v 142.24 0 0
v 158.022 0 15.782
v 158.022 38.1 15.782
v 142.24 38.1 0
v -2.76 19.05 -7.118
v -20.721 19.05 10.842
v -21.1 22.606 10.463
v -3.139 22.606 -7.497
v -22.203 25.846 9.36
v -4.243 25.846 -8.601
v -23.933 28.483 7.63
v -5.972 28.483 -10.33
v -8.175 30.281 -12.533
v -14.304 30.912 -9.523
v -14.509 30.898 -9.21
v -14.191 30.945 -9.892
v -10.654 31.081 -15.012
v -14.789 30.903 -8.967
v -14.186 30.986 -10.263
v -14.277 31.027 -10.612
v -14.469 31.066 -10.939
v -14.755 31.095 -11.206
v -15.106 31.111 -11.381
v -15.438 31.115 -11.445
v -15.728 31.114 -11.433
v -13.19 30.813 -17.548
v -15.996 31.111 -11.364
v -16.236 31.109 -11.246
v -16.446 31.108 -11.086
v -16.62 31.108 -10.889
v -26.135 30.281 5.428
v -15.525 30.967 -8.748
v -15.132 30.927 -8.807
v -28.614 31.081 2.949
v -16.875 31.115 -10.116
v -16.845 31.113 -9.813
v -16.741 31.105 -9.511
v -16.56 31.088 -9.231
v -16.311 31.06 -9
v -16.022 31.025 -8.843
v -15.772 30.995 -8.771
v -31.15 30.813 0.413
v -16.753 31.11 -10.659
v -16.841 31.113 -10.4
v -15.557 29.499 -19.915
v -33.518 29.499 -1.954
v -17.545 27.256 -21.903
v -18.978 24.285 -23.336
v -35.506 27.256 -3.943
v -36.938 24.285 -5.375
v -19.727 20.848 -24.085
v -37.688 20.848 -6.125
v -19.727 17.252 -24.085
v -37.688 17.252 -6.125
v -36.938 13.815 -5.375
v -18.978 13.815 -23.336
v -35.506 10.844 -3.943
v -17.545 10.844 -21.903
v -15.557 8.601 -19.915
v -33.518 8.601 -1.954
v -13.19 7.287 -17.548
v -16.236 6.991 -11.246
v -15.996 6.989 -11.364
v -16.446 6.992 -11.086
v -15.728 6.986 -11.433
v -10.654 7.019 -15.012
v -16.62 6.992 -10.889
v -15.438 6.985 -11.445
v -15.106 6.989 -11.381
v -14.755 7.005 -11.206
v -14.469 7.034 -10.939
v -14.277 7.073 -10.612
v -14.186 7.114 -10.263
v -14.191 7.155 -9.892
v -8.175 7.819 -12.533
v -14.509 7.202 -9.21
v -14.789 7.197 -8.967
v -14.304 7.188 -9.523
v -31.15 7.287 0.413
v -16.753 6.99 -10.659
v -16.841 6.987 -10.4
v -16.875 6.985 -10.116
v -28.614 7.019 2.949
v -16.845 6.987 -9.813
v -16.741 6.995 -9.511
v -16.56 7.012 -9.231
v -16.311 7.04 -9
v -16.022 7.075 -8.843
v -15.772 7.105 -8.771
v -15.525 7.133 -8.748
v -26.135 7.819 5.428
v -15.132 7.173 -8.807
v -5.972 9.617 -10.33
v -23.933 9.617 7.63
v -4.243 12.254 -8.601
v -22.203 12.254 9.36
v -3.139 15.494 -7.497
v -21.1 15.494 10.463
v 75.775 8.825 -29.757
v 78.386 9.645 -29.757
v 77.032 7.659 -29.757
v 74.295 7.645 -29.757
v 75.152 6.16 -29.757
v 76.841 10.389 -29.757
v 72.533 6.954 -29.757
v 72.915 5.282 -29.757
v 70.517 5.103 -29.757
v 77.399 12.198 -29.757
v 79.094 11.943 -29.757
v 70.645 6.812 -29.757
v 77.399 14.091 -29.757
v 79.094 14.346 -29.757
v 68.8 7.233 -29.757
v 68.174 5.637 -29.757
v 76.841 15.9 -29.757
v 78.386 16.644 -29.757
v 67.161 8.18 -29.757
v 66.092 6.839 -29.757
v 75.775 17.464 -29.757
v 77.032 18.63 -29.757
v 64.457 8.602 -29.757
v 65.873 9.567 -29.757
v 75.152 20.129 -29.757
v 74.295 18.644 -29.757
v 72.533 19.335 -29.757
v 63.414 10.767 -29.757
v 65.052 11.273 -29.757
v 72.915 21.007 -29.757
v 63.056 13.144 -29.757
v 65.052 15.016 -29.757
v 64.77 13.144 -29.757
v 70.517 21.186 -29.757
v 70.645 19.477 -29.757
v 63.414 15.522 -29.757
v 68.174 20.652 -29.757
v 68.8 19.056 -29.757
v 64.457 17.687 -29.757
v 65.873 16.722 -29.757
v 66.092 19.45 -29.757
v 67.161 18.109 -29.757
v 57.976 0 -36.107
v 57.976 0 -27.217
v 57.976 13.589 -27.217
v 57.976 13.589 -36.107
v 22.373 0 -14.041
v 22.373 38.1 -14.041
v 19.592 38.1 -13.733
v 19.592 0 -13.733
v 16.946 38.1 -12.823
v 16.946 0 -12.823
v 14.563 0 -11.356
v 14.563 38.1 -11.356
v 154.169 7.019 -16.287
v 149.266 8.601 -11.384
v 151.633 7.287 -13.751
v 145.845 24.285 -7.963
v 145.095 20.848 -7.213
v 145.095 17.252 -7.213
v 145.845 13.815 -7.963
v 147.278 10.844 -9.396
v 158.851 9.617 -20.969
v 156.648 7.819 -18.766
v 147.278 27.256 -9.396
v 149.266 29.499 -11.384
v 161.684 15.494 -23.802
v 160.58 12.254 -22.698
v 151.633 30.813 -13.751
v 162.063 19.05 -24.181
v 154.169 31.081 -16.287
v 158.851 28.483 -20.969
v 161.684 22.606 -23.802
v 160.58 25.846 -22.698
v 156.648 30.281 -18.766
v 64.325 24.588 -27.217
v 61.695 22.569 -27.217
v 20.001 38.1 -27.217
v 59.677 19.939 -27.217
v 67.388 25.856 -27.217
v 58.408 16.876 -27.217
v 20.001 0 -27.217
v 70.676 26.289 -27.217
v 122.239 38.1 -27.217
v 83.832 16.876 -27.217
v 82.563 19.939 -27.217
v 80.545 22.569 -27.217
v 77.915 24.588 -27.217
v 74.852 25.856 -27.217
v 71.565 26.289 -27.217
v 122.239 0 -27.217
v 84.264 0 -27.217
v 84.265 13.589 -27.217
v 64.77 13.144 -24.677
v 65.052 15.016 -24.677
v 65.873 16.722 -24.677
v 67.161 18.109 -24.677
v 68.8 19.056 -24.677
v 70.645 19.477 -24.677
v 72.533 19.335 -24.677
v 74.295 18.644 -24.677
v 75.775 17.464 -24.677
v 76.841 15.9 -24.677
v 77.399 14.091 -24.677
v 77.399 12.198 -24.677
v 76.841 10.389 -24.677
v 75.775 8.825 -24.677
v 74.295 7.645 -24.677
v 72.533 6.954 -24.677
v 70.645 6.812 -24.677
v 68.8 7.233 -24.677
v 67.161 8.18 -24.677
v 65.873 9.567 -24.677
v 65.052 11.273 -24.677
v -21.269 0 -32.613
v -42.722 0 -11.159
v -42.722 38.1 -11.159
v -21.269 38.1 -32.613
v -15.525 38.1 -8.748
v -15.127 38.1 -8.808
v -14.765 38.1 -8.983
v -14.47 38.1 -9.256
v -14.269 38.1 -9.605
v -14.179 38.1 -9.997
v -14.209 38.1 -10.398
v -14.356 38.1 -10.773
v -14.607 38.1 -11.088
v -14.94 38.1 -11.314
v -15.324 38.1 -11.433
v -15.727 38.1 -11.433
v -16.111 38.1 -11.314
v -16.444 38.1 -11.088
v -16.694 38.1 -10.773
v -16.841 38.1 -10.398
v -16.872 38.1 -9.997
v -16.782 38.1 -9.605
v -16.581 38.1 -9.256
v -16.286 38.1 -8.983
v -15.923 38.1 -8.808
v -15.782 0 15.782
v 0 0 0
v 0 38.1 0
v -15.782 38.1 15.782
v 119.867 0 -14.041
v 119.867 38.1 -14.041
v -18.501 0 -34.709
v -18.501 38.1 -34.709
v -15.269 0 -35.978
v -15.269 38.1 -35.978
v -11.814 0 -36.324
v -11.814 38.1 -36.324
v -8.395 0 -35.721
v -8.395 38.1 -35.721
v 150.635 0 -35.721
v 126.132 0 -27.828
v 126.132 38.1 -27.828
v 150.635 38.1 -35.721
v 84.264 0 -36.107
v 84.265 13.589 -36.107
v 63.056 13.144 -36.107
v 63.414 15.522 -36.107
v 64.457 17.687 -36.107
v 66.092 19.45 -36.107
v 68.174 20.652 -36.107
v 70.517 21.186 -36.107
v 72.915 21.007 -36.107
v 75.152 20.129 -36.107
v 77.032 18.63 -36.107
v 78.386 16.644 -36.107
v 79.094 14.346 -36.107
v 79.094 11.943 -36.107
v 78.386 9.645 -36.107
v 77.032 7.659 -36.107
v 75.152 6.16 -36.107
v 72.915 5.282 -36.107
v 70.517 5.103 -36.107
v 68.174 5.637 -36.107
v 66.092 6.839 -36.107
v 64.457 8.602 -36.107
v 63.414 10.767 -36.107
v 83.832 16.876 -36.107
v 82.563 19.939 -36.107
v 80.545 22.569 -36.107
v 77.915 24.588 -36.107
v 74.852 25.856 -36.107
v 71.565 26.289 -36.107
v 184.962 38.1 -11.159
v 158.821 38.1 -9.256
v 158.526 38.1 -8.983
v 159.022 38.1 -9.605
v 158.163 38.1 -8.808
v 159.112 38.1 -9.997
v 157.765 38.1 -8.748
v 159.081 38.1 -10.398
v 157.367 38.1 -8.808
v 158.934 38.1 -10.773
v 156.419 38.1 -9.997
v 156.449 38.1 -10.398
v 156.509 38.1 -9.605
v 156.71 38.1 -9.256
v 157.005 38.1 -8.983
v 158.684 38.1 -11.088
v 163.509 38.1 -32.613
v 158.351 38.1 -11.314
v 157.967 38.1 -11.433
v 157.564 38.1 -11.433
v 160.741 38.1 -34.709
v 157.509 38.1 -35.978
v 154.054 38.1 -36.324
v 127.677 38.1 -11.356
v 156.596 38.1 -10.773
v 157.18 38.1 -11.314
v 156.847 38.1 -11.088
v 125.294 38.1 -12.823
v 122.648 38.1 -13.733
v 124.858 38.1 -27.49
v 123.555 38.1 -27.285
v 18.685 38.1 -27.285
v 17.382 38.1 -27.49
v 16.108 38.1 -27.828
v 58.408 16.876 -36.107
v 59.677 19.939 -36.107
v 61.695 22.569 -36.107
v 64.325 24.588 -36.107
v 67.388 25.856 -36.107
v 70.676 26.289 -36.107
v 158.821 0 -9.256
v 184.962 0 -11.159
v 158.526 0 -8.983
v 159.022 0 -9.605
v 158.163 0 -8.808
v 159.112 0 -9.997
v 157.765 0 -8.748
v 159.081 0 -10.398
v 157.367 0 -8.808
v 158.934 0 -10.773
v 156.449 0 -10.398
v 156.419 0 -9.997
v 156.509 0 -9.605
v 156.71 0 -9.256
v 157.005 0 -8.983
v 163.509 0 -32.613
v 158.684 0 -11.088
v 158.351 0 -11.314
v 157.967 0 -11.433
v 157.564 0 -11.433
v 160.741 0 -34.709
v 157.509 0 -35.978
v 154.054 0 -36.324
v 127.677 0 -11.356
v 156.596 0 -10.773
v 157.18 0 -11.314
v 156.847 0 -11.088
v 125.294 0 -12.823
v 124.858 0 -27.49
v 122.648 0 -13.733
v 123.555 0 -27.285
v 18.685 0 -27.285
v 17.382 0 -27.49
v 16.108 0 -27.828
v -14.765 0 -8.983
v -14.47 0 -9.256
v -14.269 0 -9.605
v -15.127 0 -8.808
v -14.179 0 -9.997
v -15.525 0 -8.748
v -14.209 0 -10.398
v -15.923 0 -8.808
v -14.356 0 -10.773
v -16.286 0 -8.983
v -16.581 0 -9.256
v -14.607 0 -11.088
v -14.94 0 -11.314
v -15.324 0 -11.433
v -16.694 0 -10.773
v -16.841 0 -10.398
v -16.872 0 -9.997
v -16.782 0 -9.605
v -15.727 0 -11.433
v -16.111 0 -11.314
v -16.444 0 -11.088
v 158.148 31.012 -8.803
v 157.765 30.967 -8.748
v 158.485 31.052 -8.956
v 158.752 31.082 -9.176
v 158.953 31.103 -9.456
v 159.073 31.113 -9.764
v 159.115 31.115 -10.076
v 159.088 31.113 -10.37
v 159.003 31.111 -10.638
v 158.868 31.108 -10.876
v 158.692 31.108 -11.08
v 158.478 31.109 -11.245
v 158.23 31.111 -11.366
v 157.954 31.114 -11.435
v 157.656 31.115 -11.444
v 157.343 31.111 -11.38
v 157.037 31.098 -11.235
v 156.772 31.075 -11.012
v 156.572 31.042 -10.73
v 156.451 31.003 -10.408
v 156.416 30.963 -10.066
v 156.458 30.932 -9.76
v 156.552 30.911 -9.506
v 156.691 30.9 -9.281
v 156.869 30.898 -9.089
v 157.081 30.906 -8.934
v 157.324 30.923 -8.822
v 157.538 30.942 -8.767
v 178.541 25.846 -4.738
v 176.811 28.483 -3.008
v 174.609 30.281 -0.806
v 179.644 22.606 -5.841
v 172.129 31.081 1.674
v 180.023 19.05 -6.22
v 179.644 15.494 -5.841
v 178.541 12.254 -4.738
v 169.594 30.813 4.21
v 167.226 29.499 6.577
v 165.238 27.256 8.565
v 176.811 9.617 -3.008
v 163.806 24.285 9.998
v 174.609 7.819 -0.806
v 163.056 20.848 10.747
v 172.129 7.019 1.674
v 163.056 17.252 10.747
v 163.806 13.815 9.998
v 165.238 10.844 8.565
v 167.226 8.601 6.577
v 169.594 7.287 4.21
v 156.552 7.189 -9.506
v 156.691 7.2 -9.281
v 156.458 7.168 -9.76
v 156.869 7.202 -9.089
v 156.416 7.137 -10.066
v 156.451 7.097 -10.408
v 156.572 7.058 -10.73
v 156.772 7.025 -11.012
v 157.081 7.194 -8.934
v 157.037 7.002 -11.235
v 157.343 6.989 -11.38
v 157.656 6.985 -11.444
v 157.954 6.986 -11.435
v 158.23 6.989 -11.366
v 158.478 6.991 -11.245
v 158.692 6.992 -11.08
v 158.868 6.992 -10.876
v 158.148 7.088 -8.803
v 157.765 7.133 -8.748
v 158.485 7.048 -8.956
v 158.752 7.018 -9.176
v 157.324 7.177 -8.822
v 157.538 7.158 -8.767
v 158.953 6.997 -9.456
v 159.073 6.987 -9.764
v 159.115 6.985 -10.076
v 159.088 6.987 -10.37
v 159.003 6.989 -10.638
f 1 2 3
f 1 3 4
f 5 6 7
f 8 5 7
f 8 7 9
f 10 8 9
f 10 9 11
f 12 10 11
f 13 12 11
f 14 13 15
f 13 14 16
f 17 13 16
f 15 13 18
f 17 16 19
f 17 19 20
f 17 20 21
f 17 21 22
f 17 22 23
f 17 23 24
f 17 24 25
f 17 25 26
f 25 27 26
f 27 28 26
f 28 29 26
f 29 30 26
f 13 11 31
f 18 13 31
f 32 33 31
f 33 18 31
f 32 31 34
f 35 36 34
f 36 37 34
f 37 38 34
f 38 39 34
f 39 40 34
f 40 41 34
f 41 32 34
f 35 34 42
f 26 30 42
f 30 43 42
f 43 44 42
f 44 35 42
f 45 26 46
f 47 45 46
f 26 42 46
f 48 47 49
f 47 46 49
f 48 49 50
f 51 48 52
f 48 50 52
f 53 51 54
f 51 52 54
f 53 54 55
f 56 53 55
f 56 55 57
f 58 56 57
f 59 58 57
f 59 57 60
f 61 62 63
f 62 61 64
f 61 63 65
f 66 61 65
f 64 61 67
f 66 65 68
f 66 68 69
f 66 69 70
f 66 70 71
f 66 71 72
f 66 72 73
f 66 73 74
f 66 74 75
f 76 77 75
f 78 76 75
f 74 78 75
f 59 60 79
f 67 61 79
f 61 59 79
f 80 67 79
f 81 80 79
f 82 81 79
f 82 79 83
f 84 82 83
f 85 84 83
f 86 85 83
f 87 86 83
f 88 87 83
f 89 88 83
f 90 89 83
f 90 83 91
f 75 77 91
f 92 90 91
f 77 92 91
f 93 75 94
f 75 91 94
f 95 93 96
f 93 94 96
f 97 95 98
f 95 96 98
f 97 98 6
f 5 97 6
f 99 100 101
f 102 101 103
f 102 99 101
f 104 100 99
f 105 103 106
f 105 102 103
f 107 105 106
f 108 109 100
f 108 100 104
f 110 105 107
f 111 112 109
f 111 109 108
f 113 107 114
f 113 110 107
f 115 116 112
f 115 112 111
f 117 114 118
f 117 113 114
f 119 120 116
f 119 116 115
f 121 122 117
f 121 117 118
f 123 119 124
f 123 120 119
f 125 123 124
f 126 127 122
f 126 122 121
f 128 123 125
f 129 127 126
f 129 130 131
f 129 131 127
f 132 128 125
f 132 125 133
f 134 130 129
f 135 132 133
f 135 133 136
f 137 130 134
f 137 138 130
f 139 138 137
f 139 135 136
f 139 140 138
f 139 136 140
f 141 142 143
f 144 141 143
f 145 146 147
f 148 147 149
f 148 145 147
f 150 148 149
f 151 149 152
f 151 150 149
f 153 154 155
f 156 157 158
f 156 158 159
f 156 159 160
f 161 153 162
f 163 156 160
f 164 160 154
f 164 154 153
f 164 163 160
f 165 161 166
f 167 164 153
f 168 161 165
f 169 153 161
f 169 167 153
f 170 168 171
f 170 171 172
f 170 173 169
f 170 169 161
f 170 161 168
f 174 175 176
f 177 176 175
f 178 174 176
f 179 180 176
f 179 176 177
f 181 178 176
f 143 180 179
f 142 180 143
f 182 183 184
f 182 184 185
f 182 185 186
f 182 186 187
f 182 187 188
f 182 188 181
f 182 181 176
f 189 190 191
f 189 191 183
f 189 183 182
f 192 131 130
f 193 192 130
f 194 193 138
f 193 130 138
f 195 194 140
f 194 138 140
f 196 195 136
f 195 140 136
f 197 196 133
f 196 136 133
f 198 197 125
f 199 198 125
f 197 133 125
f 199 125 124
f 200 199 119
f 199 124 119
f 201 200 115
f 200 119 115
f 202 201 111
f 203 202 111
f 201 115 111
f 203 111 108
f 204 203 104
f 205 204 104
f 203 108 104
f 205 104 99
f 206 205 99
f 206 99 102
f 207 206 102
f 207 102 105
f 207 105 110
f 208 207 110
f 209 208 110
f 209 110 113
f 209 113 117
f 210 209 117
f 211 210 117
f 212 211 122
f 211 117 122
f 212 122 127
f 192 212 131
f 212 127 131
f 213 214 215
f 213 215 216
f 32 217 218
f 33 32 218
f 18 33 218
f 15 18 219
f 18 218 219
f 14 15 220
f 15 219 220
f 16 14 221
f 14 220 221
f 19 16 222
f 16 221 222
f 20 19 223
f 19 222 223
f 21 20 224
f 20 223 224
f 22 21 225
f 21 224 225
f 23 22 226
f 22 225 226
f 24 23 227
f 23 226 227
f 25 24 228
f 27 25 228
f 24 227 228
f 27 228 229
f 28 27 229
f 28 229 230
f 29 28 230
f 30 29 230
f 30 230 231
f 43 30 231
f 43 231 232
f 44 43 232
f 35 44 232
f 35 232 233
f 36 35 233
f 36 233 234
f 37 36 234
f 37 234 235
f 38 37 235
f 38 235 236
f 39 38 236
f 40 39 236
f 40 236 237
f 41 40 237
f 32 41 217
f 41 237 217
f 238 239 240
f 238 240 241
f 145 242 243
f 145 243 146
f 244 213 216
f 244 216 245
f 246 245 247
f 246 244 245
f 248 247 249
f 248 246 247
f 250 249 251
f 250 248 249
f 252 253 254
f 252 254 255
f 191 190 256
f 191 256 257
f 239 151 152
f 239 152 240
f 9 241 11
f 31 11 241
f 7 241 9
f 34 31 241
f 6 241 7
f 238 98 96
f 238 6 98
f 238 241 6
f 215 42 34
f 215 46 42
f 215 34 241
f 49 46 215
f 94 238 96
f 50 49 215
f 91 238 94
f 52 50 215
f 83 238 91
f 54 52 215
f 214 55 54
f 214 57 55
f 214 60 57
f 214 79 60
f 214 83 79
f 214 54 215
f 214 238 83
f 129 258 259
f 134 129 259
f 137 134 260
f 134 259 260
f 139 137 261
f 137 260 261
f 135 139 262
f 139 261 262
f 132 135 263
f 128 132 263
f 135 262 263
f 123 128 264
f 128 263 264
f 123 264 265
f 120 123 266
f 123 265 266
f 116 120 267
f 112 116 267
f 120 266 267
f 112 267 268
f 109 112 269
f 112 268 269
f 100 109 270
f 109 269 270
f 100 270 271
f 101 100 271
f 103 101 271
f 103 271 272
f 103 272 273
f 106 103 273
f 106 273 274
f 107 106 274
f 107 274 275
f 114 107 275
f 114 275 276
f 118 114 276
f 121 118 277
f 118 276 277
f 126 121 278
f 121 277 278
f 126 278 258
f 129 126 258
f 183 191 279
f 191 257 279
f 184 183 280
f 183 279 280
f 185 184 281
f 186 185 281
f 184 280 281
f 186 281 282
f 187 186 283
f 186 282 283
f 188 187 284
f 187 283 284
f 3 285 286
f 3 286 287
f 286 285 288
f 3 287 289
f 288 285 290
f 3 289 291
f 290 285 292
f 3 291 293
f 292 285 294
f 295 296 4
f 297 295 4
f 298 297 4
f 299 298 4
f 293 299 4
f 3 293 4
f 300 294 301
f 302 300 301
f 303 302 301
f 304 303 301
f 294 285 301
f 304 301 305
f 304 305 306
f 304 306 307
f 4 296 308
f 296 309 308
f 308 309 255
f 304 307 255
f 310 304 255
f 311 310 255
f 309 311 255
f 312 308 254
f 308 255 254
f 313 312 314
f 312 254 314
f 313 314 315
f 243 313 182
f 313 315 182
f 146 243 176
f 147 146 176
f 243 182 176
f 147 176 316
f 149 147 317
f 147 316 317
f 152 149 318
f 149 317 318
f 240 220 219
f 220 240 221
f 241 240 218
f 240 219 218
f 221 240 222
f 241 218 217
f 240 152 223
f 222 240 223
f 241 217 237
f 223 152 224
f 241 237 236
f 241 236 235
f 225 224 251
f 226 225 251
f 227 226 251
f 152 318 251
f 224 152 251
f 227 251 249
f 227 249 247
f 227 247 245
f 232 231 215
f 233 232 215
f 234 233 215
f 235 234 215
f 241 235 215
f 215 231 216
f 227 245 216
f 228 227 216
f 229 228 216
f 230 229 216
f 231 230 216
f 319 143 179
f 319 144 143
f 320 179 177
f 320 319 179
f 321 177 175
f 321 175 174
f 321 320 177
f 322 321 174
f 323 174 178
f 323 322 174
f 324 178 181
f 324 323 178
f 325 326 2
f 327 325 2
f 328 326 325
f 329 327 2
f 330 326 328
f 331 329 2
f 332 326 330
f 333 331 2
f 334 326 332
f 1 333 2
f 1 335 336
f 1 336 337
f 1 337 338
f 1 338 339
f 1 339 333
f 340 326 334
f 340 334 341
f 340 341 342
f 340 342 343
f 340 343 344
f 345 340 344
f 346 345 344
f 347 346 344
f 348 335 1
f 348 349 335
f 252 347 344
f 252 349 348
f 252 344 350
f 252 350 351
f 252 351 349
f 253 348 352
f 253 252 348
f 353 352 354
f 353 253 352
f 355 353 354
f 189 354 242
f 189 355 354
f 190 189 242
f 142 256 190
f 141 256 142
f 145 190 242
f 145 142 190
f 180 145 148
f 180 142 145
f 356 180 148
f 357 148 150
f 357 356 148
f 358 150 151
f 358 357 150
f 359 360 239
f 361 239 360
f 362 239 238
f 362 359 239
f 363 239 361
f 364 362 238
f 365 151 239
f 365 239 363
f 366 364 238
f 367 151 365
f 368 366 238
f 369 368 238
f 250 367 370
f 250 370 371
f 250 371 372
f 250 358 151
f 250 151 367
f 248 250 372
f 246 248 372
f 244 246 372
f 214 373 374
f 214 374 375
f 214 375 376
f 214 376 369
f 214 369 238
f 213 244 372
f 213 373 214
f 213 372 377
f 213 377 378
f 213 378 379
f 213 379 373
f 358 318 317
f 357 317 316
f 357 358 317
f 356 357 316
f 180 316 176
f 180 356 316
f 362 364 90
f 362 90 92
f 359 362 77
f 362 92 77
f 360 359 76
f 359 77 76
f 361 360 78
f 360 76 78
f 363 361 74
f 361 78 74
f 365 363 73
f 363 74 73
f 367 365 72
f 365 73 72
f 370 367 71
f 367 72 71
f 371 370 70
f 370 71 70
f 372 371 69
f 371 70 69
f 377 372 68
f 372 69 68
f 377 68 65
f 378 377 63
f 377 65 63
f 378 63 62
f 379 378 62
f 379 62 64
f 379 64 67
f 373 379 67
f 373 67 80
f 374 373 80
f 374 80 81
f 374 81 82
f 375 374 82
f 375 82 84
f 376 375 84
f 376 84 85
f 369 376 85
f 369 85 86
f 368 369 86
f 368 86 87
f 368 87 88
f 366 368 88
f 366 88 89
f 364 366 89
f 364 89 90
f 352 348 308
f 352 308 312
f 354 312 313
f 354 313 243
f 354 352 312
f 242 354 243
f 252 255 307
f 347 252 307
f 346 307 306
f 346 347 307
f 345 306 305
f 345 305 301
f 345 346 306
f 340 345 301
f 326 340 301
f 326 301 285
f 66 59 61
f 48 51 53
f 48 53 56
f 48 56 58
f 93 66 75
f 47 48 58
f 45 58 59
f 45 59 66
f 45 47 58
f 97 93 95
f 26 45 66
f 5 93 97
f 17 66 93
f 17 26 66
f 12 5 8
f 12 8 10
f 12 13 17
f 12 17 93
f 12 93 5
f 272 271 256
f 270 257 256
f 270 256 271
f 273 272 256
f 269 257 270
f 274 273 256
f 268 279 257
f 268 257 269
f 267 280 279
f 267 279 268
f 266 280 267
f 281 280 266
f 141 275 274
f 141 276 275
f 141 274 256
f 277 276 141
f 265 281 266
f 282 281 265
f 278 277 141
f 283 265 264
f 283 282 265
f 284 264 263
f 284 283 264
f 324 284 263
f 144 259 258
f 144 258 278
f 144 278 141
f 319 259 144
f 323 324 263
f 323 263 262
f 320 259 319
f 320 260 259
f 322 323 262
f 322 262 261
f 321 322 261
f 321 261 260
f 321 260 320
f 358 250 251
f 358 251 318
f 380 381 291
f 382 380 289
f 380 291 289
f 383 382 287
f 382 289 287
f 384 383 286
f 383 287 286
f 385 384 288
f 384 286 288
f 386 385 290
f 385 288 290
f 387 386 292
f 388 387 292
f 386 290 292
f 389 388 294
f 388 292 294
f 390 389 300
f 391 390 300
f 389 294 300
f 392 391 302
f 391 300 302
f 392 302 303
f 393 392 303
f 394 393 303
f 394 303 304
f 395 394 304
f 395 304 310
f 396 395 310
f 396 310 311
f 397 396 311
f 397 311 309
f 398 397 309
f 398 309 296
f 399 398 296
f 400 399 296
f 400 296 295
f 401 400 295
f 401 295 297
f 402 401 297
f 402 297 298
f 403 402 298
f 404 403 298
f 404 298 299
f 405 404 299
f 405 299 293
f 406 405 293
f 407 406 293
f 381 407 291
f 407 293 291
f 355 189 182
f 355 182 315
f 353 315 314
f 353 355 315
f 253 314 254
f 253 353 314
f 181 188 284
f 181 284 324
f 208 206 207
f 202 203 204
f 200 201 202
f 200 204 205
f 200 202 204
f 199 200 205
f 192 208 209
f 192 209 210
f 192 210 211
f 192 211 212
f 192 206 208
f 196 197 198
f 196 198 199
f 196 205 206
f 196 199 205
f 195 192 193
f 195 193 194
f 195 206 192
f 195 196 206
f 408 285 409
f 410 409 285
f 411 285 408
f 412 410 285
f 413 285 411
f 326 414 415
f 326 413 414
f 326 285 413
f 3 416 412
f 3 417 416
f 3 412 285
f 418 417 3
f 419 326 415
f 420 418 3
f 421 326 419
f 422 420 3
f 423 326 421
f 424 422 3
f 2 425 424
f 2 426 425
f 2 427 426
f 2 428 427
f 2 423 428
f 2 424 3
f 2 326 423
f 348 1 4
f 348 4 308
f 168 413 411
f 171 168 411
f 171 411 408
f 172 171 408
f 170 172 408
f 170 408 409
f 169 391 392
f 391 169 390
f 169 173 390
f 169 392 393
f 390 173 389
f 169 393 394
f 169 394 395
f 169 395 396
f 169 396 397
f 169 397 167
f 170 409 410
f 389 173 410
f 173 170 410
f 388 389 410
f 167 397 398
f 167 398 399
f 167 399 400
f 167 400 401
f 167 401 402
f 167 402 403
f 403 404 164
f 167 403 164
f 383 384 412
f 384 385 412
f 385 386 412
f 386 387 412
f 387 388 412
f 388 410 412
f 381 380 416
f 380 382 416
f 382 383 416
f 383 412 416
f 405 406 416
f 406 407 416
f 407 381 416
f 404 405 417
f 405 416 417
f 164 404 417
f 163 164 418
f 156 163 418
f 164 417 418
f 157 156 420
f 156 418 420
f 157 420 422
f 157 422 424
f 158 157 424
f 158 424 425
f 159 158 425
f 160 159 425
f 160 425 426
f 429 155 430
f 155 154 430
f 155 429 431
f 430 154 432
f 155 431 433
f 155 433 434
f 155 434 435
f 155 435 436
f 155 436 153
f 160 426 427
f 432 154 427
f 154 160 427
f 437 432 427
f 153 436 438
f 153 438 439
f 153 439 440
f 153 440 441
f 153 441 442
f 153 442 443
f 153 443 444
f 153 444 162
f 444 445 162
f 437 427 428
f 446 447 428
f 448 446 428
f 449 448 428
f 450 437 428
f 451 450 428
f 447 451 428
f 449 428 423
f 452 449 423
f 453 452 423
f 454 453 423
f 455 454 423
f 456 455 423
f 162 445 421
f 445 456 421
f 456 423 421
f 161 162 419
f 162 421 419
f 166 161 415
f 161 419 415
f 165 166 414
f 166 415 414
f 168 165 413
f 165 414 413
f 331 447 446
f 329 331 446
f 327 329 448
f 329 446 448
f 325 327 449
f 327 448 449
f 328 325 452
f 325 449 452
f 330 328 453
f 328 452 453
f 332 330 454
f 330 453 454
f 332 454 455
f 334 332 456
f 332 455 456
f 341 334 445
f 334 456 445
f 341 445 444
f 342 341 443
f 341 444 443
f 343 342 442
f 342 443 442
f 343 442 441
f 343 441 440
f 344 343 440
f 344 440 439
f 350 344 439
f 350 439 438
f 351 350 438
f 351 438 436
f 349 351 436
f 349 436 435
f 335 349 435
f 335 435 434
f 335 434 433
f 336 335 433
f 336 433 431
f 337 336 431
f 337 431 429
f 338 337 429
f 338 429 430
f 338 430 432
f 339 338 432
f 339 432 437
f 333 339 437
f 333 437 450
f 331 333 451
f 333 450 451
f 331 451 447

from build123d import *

# Parameters (mm, degrees)
BOSS_EXTRUDE1_DEPTH = 38.1
SKETCH2_R           = 12.065
CUT_EXTRUDE1_DEPTH  = 25.4
SKETCH7_R           = 12.065
CUT_EXTRUDE2_DEPTH  = 25.4
SKETCH9_W           = 26.289
SKETCH9_H           = 26.289
BOSS_EXTRUDE3_DEPTH = 8.89
SKETCH10_R          = 8.0645
CUT_EXTRUDE3_DEPTH  = 6.35
SKETCH12_R          = 6.35
CUT_EXTRUDE5_DEPTH  = 5.08
FILLET1_R           = 12.7
SKETCH13_R          = 1.35
CUT_EXTRUDE6_DEPTH  = 51.816


with BuildPart() as part:
    # Sketch1 → Boss-Extrude1 (new body)
    with BuildSketch(Plane(origin=(0, 0, 0), x_dir=(1, 0, 0), z_dir=(0, 1, 0))):
        with BuildLine():
            Line((-8.394951703, 35.720764917), (16.107614613, 27.828435078))
            ThreePointArc((16.107614613, 27.828435078), (18.03059142, 27.370657964), (20.001310729, 27.216823331))
            Line((20.001310729, 27.216823331), (122.238689271, 27.216823331))
            ThreePointArc((122.238689271, 27.216823331), (124.20940858, 27.370657964), (126.132385387, 27.828435078))
            Line((126.132385387, 27.828435078), (150.634951703, 35.720764917))
            ThreePointArc((150.634951703, 35.720764917), (157.509150211, 35.977683688), (163.508903941, 32.612632786))
            Line((163.508903941, 32.612632786), (184.96230509, 11.159231637))
            Line((184.96230509, 11.159231637), (158.021536726, -15.781536726))
            Line((158.021536726, -15.781536726), (142.24, 0))
            Line((142.24, 0), (127.676821583, 11.356327171))
            ThreePointArc((127.676821583, 11.356327171), (123.996342172, 13.351360126), (119.867179962, 14.041363479))
            Line((119.867179962, 14.041363479), (22.372820038, 14.041363479))
            ThreePointArc((22.372820038, 14.041363479), (18.243657828, 13.351360126), (14.563178417, 11.356327171))
            Line((14.563178417, 11.356327171), (0, 0))
            Line((0, 0), (-15.781536726, -15.781536726))
            Line((-15.781536726, -15.781536726), (-42.72230509, 11.159231637))
            Line((-42.72230509, 11.159231637), (-21.268903941, 32.612632786))
            ThreePointArc((-21.268903941, 32.612632786), (-15.269150211, 35.977683688), (-8.394951703, 35.720764917))
        make_face()
    extrude(amount=BOSS_EXTRUDE1_DEPTH)

    # Sketch2 → Cut-Extrude1 (cut)
    with BuildSketch(Plane(origin=(-15.781536726, 0, 15.781536726), x_dir=(0.7071067811865477, 0, 0.7071067811865475), z_dir=(-0.7071067811865475, 0, 0.7071067811865477))):
        with Locations((-19.05, 19.05)):
            Circle(SKETCH2_R)
    extrude(amount=-CUT_EXTRUDE1_DEPTH, mode=Mode.SUBTRACT)

    # Sketch7 → Cut-Extrude2 (cut)
    with BuildSketch(Plane(origin=(86.901536726, 0, 86.901536726), x_dir=(0.7071067811865472, 0, -0.7071067811865478), z_dir=(0.7071067811865478, 0, 0.7071067811865472))):
        with Locations((119.628868556, 19.05)):
            Circle(SKETCH7_R)
    extrude(amount=-CUT_EXTRUDE2_DEPTH, mode=Mode.SUBTRACT)

    # Sketch9 → Boss-Extrude3 (add)
    with BuildSketch(Plane(origin=(0, 0, -27.216823331), x_dir=(-1, 0, 0), z_dir=(0, 0, -1))):
        with Locations((-71.12, 13.1445)):
            Rectangle(SKETCH9_W, SKETCH9_H)
    extrude(amount=BOSS_EXTRUDE3_DEPTH)

    # Sketch10 → Cut-Extrude3 (cut)
    with BuildSketch(Plane(origin=(0, 0, -36.106823331), x_dir=(-1, 0, 0), z_dir=(0, 0, -1))):
        with Locations((-71.12, 13.1445)):
            Circle(SKETCH10_R)
    extrude(amount=-CUT_EXTRUDE3_DEPTH, mode=Mode.SUBTRACT)

    # Sketch12 → Cut-Extrude5 (cut)
    with BuildSketch(Plane(origin=(0, 0, -29.756823331), x_dir=(-1, 0, 0), z_dir=(0, 0, -1))):
        with Locations((-71.12, 13.1445)):
            Circle(SKETCH12_R)
    extrude(amount=-CUT_EXTRUDE5_DEPTH, mode=Mode.SUBTRACT)

    # Fillet1
    fillet1_edges = [part.edges().sort_by_distance(p)[0] for p in [
        (57.9755, 26.289, -31.661823331),
        (84.2645, 26.289, -31.661823331),
    ]]
    fillet(fillet1_edges, radius=FILLET1_R)

    # Sketch13 → Cut-Extrude6 (cut)
    with BuildSketch(Plane(origin=(0, 38.1, 0), x_dir=(1, 0, 0), z_dir=(0, 1, 0))):
        with Locations(Location((-15.525343469, 10.098073481, 0), (0, 0, 270))):
            Circle(SKETCH13_R)
        with Locations(Location((157.765343469, 10.098073481, 0), (0, 0, 270))):
            Circle(SKETCH13_R)
    extrude(amount=-CUT_EXTRUDE6_DEPTH, mode=Mode.SUBTRACT)


solid = part.part
